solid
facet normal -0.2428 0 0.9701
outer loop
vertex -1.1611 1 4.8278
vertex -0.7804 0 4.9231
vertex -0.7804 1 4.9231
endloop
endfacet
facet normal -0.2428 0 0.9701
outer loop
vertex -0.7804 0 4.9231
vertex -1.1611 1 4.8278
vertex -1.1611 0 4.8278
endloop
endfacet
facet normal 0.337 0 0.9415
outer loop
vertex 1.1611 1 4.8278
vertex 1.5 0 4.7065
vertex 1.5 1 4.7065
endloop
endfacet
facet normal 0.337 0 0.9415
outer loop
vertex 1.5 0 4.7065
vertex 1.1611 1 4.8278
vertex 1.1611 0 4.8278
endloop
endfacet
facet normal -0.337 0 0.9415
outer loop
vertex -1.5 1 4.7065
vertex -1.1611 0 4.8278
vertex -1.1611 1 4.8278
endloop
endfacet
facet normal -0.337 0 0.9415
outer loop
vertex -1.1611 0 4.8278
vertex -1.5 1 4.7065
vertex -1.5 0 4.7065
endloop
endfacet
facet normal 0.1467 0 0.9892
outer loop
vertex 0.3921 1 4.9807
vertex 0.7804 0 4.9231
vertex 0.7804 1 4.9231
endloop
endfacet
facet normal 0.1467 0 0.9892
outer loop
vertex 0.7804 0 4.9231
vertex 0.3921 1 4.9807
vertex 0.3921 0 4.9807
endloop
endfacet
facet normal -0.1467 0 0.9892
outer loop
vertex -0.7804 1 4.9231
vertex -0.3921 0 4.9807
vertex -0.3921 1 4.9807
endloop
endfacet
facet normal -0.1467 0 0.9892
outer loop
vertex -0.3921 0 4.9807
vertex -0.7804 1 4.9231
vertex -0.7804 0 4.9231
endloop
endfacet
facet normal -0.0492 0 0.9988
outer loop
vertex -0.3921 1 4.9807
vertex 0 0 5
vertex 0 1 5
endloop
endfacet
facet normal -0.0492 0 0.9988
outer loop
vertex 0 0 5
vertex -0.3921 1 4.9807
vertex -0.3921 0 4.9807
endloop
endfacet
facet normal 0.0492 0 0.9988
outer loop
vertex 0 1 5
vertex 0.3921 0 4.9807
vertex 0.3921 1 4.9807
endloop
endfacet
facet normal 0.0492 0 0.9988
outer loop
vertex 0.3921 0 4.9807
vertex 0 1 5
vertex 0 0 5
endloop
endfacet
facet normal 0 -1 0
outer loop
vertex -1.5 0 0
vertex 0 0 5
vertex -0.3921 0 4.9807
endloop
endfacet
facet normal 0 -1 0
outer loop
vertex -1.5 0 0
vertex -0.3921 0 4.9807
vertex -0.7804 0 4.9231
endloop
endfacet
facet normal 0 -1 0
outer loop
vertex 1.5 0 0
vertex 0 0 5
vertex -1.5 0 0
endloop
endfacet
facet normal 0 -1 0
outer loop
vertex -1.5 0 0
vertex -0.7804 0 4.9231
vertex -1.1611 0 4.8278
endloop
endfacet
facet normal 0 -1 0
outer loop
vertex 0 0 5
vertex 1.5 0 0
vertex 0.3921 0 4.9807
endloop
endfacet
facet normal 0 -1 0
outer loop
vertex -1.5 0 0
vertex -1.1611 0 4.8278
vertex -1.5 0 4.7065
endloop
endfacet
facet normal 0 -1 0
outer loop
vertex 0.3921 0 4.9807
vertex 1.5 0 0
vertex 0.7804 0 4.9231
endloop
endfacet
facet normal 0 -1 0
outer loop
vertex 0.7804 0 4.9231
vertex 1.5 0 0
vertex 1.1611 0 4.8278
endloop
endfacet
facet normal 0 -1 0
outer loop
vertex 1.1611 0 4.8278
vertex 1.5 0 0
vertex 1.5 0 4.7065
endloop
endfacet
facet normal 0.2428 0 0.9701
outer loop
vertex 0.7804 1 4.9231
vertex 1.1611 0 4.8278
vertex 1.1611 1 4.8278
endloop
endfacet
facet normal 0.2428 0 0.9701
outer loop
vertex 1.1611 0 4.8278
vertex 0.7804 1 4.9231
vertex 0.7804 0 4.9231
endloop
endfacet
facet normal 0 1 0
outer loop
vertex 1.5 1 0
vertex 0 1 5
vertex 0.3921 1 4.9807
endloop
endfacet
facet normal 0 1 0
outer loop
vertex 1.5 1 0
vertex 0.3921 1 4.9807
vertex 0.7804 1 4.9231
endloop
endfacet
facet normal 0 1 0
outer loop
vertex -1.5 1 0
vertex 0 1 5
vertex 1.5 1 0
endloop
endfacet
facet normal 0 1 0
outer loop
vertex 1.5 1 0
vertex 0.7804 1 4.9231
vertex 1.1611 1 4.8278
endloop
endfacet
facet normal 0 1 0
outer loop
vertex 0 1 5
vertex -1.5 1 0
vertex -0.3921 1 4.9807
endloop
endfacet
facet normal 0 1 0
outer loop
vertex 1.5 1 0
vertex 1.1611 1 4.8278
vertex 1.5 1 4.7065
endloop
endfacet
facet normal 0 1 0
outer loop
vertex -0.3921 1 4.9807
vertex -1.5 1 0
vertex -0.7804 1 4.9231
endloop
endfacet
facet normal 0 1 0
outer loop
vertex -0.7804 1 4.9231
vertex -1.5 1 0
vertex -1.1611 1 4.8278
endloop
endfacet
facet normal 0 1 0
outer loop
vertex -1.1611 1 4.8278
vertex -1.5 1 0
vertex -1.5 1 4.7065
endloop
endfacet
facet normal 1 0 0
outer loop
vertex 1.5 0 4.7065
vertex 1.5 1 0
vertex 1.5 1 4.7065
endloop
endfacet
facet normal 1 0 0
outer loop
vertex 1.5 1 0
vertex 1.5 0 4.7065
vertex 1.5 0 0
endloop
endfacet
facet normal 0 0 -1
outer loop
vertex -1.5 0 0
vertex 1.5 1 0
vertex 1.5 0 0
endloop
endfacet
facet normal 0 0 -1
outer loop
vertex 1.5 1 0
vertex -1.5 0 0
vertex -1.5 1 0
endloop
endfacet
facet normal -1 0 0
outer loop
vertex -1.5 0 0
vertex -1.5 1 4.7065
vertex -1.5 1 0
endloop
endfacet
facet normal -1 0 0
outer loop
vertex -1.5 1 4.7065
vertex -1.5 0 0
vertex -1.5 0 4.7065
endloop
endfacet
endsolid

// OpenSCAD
module dvere(sirka, vyska, hloubka=1) {
  intersection() {
    rotate(90, [1,0,0]) translate([0,vyska*0.2,-hloubka]) cylinder(hloubka,vyska*0.8,vyska*0.8,$fn=64);
    translate([-sirka/2,0,0]) cube([sirka,hloubka,vyska]);
  }
}

dvere(3,5);

//difference() {
//  cylinder(10,5,5, $fn=64);
//  translate([0,4.3,2.5]) okno(2,5);
//  rotate(30,[0,0,1]) translate([0,4.3,2.5]) okno(2,5);
//  rotate(-30,[0,0,1]) translate([0,4.3,2.5]) okno(2,5);
//}
